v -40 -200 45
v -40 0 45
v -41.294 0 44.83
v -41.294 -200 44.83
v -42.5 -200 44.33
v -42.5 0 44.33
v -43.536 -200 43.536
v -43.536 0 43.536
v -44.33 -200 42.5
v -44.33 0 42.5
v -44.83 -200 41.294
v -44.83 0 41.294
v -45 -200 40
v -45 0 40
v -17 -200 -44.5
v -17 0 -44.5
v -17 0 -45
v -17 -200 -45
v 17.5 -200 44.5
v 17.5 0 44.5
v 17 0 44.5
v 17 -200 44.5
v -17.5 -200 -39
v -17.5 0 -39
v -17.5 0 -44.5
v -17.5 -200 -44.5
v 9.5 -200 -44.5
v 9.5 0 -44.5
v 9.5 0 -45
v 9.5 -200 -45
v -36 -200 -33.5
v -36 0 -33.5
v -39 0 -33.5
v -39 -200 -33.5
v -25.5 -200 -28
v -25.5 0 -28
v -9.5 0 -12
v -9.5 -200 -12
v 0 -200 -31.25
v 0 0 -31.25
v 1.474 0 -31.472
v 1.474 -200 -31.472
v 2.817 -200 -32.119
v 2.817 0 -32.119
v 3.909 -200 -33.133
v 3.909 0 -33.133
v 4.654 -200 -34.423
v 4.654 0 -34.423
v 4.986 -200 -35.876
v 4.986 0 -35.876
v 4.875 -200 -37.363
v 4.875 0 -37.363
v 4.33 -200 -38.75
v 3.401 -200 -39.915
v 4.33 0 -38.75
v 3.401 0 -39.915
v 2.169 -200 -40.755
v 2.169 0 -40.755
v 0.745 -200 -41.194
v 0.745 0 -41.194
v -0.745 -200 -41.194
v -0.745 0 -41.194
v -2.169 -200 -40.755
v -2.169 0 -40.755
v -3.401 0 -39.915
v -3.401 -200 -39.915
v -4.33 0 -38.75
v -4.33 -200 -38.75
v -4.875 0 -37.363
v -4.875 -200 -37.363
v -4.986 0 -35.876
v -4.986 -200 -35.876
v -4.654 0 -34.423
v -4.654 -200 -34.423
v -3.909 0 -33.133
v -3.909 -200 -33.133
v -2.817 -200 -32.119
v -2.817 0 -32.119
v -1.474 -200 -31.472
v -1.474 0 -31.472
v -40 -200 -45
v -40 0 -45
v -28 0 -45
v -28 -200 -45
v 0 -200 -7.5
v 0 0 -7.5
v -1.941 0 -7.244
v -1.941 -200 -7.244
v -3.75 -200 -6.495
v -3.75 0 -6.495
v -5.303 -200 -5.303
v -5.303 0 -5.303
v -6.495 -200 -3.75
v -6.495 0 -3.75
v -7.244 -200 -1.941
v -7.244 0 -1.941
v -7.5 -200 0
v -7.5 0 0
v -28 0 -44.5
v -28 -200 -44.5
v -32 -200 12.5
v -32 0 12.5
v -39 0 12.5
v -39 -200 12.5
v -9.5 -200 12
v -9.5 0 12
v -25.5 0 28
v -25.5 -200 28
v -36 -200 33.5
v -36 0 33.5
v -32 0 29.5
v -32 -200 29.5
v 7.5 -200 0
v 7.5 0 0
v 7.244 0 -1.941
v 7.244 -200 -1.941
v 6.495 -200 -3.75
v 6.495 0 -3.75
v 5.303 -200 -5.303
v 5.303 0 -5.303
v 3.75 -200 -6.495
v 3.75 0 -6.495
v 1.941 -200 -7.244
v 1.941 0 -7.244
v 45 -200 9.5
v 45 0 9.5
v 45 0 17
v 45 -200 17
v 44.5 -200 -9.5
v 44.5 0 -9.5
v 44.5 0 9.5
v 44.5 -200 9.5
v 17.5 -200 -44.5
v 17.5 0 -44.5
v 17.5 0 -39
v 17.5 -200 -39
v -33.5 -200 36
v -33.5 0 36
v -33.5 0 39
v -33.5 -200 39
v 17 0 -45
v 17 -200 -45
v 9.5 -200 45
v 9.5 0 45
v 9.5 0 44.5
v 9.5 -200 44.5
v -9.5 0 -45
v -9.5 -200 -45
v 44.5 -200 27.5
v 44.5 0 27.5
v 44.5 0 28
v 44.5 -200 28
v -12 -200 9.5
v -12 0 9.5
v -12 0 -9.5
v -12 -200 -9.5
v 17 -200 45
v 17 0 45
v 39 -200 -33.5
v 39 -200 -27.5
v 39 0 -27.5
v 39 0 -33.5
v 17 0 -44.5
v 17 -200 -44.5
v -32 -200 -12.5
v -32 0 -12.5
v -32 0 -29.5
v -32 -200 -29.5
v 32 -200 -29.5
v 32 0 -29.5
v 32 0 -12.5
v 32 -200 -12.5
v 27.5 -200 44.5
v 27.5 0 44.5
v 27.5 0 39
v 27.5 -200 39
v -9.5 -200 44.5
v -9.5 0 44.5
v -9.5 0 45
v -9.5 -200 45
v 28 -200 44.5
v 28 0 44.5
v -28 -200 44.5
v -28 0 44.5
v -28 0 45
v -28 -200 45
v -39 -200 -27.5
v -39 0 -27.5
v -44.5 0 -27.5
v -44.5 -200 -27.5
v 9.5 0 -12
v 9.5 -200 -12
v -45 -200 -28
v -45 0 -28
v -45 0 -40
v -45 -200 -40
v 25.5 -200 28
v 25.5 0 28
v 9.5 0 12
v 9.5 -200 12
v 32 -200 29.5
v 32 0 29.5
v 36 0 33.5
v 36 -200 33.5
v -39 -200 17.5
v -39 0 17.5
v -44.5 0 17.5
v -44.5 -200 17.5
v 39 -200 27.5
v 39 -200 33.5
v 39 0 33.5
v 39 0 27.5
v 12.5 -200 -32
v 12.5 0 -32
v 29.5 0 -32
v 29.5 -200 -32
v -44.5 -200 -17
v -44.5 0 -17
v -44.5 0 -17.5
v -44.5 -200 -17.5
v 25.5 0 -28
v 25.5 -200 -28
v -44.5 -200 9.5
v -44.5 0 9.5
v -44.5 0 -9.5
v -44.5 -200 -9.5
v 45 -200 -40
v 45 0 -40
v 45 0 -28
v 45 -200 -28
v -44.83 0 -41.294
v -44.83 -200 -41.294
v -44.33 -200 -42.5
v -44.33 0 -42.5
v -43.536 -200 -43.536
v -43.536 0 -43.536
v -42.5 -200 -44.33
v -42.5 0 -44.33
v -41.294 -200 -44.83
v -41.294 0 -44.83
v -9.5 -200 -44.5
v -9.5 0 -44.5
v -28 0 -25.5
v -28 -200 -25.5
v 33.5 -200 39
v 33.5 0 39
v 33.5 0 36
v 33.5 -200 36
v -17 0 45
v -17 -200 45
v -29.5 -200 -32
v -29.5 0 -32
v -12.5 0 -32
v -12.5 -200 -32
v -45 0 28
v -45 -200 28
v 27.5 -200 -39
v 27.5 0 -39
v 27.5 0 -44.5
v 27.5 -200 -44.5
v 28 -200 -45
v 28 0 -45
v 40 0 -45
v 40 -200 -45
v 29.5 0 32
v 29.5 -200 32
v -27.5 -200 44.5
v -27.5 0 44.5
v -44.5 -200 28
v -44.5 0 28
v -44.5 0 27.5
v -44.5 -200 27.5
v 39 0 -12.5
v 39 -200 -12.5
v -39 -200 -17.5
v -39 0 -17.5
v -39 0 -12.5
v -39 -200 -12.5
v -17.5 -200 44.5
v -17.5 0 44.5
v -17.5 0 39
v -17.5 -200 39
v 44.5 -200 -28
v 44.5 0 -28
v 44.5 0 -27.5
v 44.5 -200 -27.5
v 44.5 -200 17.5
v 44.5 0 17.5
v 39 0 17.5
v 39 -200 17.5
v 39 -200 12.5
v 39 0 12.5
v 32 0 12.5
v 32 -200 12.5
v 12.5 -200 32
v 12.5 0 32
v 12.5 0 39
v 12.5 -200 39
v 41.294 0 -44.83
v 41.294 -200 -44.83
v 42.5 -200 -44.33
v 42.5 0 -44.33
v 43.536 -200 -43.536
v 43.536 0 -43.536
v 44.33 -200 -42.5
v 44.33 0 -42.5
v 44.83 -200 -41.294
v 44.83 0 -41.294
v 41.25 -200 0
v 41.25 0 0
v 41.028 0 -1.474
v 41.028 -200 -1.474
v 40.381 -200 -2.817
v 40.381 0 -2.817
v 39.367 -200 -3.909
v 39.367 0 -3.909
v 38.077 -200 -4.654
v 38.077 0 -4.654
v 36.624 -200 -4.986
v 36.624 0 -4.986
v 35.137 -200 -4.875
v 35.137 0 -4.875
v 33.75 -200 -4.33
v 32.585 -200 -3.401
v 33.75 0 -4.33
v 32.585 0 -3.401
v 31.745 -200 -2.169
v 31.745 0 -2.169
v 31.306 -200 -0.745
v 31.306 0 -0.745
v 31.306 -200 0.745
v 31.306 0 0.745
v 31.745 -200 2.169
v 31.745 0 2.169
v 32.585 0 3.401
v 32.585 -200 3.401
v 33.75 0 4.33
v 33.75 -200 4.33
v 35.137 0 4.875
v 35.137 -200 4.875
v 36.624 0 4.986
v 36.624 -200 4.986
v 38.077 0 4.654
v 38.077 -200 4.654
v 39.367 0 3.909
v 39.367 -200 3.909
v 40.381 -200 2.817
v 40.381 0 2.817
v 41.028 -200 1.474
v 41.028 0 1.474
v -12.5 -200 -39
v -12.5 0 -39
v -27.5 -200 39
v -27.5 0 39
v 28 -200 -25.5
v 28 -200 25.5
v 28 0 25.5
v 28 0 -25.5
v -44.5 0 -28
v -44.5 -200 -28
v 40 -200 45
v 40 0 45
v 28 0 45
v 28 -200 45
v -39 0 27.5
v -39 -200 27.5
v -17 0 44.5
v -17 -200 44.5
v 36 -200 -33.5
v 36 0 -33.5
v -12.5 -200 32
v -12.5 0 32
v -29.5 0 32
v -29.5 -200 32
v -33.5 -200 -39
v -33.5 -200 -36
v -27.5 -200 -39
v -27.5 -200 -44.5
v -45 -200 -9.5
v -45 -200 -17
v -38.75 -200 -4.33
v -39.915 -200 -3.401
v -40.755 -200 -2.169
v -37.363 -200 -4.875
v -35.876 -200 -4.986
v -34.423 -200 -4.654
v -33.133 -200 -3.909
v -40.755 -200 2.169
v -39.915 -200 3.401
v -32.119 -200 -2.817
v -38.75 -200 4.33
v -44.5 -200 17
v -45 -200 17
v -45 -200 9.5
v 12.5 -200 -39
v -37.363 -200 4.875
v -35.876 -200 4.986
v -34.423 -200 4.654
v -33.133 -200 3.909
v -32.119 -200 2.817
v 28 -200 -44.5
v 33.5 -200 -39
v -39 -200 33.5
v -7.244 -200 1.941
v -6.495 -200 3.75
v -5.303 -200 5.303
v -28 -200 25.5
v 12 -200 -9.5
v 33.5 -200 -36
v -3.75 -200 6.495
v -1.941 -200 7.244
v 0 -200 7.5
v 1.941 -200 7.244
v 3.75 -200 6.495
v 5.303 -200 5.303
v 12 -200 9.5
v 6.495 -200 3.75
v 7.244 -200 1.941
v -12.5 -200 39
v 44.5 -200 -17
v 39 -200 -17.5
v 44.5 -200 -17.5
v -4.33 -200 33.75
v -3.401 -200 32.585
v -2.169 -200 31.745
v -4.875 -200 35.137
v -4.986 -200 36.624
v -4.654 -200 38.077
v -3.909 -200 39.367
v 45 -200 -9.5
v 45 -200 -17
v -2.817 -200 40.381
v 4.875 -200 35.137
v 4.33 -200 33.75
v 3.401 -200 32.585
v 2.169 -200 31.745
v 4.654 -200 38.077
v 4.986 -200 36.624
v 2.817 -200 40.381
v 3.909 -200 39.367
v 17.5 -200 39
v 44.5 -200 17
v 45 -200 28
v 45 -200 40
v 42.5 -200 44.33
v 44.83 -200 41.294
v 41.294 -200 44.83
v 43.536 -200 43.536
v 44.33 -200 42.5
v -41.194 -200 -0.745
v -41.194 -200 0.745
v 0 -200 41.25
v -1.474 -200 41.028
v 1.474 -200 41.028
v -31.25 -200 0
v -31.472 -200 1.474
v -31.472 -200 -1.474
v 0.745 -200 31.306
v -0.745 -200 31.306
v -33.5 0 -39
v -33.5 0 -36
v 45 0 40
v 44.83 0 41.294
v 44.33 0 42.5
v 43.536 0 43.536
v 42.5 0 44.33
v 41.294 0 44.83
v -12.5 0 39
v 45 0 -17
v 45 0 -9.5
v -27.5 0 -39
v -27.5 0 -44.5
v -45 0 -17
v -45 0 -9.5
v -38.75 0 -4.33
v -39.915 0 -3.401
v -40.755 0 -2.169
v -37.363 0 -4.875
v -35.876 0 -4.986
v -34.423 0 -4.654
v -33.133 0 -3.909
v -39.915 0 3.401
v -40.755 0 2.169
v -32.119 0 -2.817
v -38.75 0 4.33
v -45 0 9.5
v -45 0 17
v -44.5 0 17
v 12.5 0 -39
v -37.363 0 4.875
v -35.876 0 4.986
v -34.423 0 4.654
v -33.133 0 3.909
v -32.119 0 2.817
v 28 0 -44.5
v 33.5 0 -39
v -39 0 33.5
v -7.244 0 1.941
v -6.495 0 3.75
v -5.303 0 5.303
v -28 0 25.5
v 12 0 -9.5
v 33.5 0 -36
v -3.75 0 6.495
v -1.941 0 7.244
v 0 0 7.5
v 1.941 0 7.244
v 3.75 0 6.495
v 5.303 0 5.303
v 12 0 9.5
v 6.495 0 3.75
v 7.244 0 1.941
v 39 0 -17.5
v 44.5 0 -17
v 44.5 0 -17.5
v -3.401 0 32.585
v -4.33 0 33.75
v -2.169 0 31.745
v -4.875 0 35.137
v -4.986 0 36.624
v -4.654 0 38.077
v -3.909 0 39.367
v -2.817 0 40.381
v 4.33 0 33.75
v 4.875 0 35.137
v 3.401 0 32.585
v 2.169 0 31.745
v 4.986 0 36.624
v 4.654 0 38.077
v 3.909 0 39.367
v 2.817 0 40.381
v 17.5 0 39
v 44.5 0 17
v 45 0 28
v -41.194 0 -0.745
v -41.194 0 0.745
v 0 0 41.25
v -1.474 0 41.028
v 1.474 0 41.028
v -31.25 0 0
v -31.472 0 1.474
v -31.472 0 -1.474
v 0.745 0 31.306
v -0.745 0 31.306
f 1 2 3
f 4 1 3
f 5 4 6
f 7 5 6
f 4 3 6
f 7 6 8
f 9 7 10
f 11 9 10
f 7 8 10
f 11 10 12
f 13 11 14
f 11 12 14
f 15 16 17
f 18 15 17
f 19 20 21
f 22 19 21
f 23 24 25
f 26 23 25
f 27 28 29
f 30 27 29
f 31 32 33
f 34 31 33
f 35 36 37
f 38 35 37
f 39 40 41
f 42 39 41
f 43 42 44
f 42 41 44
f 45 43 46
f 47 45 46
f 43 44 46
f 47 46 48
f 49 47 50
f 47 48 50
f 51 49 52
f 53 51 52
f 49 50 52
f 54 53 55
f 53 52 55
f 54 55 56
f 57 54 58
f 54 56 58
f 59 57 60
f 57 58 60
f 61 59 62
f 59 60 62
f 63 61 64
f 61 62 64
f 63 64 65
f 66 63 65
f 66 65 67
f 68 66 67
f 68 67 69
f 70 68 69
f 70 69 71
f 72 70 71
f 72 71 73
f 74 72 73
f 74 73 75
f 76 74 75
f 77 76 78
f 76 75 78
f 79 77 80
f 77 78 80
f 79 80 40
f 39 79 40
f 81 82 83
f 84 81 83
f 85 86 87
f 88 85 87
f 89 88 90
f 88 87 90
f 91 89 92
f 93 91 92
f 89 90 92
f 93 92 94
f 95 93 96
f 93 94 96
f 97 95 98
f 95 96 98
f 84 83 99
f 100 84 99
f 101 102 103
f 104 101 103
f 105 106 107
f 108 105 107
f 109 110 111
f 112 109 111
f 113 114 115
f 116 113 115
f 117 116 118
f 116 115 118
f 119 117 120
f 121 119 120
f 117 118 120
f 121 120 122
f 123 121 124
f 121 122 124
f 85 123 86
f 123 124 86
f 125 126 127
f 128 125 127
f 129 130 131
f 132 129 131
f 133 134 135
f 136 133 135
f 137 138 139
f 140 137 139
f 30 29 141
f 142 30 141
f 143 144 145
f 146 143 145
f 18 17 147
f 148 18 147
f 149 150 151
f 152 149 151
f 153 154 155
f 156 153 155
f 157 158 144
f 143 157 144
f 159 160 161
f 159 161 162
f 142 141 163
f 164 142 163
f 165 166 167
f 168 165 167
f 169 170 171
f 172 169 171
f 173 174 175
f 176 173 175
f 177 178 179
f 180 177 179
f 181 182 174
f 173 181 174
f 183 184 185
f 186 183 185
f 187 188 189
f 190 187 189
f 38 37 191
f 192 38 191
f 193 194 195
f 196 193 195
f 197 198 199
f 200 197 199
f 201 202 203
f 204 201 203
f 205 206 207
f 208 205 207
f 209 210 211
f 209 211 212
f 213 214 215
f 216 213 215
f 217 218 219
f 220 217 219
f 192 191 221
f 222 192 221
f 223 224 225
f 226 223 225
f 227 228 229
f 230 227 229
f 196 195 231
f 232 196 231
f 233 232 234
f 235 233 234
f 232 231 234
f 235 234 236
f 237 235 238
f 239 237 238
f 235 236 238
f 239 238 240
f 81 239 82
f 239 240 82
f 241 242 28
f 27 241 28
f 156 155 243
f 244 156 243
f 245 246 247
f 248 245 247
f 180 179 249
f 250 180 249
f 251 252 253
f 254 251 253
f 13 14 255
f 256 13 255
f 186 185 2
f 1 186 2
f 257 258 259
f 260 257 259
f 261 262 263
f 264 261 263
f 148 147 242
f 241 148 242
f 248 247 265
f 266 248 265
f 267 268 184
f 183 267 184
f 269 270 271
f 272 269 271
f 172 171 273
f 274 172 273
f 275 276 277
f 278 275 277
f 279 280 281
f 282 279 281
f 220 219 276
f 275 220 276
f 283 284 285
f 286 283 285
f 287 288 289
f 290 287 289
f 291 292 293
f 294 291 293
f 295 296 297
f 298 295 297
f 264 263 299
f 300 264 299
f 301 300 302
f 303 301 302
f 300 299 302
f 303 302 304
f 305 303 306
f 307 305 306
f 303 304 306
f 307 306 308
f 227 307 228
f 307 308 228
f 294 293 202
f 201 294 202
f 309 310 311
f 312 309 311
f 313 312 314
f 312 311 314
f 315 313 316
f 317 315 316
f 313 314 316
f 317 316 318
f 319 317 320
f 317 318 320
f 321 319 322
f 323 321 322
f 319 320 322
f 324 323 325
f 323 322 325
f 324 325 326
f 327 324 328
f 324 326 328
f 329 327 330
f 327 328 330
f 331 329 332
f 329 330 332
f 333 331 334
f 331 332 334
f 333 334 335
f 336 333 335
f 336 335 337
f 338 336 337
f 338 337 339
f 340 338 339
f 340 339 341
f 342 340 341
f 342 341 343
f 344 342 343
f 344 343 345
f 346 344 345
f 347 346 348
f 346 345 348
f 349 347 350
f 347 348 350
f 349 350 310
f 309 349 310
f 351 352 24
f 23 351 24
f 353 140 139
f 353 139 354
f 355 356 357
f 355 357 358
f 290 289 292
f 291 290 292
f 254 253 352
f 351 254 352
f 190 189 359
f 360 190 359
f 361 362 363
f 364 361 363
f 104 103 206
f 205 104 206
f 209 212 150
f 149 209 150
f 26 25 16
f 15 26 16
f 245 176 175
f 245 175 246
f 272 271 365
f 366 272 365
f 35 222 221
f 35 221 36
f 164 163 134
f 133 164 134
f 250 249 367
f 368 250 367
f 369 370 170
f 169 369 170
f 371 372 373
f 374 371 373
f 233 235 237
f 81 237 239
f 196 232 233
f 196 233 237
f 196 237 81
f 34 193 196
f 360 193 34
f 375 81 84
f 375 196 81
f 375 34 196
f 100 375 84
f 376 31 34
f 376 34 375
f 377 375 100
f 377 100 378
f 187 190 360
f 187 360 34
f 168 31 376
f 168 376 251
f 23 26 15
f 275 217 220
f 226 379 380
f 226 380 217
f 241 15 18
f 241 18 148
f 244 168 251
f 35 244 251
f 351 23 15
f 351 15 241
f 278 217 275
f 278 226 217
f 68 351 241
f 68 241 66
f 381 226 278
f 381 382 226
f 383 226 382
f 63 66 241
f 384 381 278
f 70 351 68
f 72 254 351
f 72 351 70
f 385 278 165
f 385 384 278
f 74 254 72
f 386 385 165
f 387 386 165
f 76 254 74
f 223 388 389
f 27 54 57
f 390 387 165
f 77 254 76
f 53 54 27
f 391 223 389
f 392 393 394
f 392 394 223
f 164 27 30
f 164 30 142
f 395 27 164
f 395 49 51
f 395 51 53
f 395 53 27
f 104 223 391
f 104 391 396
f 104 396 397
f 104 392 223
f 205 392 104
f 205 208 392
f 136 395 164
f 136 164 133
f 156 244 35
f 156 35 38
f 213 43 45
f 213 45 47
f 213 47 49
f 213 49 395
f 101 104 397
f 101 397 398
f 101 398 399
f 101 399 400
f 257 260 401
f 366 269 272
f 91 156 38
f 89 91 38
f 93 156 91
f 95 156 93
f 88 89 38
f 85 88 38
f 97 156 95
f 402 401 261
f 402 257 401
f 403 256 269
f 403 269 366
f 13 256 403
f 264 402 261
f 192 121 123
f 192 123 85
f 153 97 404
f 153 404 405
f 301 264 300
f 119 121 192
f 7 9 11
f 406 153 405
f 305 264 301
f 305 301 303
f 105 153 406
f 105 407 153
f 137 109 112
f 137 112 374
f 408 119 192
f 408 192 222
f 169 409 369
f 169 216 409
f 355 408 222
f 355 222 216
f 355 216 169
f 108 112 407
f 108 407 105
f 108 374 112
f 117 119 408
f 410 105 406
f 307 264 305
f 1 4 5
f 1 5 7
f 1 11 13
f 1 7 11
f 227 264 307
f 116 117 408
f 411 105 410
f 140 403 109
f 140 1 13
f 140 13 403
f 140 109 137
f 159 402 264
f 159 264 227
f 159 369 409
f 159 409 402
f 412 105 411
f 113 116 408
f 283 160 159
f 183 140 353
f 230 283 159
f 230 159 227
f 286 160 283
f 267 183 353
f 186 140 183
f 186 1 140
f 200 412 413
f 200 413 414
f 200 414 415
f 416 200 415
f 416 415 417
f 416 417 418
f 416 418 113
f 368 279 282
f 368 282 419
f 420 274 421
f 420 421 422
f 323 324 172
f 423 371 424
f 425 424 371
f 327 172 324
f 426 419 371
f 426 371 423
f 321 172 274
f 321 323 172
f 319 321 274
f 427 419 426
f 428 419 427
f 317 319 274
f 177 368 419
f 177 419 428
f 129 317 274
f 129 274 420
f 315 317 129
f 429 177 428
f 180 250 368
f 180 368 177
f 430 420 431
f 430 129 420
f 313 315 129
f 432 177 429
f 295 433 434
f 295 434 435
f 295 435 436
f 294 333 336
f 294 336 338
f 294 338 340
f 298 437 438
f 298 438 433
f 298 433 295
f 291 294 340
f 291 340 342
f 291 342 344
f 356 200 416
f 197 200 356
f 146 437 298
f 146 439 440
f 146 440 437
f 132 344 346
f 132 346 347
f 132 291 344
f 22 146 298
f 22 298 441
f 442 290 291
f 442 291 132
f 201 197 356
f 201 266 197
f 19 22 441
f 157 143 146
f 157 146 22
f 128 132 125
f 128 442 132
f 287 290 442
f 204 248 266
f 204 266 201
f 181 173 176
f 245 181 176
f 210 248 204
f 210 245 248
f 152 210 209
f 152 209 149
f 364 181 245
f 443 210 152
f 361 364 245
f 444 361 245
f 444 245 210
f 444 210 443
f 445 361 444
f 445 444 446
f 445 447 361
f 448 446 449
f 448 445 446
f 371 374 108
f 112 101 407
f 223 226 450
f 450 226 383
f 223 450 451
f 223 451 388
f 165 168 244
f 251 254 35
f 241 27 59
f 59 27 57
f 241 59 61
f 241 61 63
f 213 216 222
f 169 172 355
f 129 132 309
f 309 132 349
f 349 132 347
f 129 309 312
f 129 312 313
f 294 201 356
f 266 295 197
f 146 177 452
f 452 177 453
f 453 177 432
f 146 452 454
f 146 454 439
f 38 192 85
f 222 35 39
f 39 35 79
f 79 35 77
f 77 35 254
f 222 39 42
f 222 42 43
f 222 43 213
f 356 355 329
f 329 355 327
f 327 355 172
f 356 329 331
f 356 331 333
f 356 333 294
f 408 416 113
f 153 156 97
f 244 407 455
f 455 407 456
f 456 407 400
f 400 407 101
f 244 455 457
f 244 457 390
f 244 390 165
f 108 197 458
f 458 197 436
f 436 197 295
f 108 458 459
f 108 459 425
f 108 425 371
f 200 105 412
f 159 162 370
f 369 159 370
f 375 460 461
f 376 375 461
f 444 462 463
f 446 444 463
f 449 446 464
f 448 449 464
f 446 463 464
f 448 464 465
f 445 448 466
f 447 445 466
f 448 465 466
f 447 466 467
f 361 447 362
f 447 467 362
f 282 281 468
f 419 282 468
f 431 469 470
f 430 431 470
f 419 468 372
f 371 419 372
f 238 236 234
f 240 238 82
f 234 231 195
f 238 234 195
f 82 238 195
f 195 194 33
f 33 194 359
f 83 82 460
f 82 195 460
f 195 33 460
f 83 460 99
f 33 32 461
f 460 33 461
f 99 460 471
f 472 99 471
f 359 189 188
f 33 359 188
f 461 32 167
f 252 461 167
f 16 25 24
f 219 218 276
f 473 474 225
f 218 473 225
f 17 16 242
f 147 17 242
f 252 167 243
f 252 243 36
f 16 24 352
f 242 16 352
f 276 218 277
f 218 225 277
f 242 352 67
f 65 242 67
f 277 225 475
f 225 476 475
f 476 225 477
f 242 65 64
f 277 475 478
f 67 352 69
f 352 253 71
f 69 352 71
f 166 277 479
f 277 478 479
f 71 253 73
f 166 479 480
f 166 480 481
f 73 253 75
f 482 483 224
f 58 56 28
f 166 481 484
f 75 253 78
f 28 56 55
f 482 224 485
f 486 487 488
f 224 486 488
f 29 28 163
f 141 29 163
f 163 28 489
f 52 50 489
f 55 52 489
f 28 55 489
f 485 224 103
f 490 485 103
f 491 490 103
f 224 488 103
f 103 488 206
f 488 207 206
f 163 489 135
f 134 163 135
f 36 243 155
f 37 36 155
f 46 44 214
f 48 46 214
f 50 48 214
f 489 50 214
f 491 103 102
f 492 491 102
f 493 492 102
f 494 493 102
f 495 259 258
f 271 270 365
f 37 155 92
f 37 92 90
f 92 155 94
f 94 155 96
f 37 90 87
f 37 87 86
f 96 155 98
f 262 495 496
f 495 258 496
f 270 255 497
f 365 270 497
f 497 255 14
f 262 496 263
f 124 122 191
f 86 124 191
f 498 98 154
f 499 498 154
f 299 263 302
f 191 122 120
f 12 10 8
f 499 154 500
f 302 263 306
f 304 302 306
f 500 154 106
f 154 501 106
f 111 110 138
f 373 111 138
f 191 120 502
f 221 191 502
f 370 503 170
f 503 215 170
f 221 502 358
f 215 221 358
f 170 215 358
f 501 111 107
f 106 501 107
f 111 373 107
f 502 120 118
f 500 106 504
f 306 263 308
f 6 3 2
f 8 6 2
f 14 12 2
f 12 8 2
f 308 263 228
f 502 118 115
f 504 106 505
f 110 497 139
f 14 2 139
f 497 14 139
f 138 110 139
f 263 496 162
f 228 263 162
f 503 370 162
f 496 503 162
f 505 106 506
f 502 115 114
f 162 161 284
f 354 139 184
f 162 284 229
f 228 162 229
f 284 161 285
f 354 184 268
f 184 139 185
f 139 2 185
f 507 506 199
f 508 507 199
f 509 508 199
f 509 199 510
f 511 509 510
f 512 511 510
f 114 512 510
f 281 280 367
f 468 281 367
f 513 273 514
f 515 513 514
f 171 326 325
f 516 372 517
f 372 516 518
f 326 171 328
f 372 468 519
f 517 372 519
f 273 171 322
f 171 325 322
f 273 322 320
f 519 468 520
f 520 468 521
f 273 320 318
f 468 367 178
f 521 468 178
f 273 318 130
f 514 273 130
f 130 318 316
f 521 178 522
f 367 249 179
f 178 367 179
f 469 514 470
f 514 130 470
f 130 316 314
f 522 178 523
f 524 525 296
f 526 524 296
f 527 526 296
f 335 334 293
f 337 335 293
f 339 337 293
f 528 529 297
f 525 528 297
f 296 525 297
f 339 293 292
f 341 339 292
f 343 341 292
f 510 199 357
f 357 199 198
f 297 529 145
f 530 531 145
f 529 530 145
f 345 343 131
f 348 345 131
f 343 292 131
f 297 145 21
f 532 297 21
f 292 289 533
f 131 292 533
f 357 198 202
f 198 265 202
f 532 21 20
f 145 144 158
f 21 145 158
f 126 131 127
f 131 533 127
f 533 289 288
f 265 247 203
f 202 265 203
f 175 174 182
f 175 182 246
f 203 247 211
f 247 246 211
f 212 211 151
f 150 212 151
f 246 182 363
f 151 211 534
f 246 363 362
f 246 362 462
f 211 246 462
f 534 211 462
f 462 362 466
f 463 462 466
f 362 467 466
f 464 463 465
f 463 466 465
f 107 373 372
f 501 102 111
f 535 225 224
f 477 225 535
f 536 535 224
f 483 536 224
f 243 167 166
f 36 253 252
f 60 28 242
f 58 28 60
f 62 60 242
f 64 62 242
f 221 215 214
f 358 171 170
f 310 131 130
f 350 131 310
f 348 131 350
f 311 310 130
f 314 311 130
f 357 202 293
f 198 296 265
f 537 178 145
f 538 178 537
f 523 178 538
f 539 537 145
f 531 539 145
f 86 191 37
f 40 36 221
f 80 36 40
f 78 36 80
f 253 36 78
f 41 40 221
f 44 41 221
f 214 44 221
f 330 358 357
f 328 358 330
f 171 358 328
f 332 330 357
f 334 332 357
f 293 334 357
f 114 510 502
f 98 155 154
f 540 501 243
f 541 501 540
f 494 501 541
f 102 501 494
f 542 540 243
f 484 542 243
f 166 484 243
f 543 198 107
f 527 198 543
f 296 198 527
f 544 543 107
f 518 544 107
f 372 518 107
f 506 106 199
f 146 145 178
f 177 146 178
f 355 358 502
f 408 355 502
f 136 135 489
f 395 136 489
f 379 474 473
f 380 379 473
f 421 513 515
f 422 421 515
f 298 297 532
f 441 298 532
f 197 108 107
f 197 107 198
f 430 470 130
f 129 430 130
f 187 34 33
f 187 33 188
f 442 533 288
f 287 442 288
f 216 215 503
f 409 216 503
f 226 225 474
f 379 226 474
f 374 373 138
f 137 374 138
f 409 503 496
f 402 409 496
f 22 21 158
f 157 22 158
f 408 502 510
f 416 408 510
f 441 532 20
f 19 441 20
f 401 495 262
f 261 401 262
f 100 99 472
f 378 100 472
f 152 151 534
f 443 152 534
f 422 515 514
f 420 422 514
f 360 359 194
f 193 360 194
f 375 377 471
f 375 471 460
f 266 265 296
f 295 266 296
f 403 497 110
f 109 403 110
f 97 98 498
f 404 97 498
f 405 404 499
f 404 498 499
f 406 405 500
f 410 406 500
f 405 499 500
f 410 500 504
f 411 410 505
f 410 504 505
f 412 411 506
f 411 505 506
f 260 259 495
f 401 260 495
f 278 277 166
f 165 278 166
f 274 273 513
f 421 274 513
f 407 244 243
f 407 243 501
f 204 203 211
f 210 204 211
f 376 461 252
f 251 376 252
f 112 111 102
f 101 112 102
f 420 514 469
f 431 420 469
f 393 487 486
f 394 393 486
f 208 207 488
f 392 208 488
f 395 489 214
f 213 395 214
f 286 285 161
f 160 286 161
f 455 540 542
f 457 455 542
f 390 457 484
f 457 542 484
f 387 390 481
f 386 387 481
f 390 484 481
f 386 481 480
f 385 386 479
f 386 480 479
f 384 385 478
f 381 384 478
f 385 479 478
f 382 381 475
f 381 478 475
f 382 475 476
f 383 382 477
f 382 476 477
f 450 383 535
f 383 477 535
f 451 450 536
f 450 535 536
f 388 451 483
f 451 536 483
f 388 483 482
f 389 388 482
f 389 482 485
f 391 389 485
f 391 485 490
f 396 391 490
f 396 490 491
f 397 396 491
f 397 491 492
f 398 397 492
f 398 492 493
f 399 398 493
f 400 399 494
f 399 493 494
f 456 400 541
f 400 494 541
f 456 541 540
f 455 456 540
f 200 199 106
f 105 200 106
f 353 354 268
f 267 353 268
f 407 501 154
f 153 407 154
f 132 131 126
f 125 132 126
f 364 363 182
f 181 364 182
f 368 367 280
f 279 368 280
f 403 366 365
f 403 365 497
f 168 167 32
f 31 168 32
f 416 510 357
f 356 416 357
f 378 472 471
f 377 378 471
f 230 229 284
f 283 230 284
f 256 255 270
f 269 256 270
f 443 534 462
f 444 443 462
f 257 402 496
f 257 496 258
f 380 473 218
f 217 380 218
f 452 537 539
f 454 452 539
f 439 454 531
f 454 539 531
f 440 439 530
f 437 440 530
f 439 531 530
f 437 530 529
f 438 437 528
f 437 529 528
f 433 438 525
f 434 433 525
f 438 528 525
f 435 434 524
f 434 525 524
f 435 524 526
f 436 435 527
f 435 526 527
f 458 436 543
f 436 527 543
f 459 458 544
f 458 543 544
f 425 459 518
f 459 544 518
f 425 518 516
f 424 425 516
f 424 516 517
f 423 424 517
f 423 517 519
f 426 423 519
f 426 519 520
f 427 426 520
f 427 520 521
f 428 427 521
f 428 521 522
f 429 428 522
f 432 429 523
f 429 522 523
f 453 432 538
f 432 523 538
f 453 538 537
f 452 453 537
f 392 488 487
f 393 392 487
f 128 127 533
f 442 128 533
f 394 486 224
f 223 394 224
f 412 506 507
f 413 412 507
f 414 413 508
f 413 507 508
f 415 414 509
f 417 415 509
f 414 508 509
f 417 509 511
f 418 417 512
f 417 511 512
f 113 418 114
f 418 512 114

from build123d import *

# Parameters (mm, degrees)
F1_DEPTH = 200


with BuildPart() as f1:
    # F0 (on Front) → F1 (new body)
    with BuildSketch(Plane.XZ):
        with BuildLine():
            Line((0, 41.25), (0, 44.5))
            Line((0, 44.5), (-9.5, 44.5))
            Line((-9.5, 44.5), (-9.5, 45))
            Line((-9.5, 45), (-17, 45))
            Line((-17, 45), (-17, 44.5))
            Line((-17, 44.5), (-17.5, 44.5))
            Line((-17.5, 44.5), (-17.5, 39))
            Line((-17.5, 39), (-12.5, 39))
            Line((-12.5, 39), (-12.5, 32))
            Line((-12.5, 32), (-29.5, 32))
            Line((-29.5, 32), (-33.5, 36))
            Line((-33.5, 36), (-33.5, 39))
            Line((-33.5, 39), (-27.5, 39))
            Line((-27.5, 39), (-27.5, 44.5))
            Line((-27.5, 44.5), (-28, 44.5))
            Line((-28, 44.5), (-28, 45))
            Line((-28, 45), (-40, 45))
            ThreePointArc((-40, 45), (-43.535534, 43.535534), (-45, 40))
            Line((-45, 40), (-45, 28))
            Line((-45, 28), (-44.5, 28))
            Line((-44.5, 28), (-44.5, 27.5))
            Line((-44.5, 27.5), (-39, 27.5))
            Line((-39, 27.5), (-39, 33.5))
            Line((-39, 33.5), (-36, 33.5))
            Line((-36, 33.5), (-32, 29.5))
            Line((-32, 29.5), (-32, 12.5))
            Line((-32, 12.5), (-39, 12.5))
            Line((-39, 12.5), (-39, 17.5))
            Line((-39, 17.5), (-44.5, 17.5))
            Line((-44.5, 17.5), (-44.5, 17))
            Line((-44.5, 17), (-45, 17))
            Line((-45, 17), (-45, 9.5))
            Line((-45, 9.5), (-44.5, 9.5))
            Line((-44.5, 9.5), (-44.5, 0))
            Line((-44.5, 0), (-41.25, 0))
            ThreePointArc((-41.25, 0), (-36.25, 5), (-31.25, 0))
            Line((-31.25, 0), (-28, 0))
            Line((-28, 0), (-28, 25.5))
            Line((-28, 25.5), (-12, 9.5))
            Line((-12, 9.5), (-12, 0))
            Line((-12, 0), (-7.5, 0))
            ThreePointArc((-7.5, 0), (-5.303301, 5.303301), (0, 7.5))
            Line((0, 7.5), (0, 12))
            Line((0, 12), (-9.5, 12))
            Line((-9.5, 12), (-25.5, 28))
            Line((-25.5, 28), (0, 28))
            Line((0, 28), (0, 31.25))
            ThreePointArc((0, 31.25), (-5, 36.25), (0, 41.25))
        make_face()
        with BuildLine():
            Line((40, 45), (28, 45))
            Line((28, 45), (28, 44.5))
            Line((28, 44.5), (27.5, 44.5))
            Line((27.5, 44.5), (27.5, 39))
            Line((27.5, 39), (33.5, 39))
            Line((33.5, 39), (33.5, 36))
            Line((33.5, 36), (29.5, 32))
            Line((29.5, 32), (12.5, 32))
            Line((12.5, 32), (12.5, 39))
            Line((12.5, 39), (17.5, 39))
            Line((17.5, 39), (17.5, 44.5))
            Line((17.5, 44.5), (17, 44.5))
            Line((17, 44.5), (17, 45))
            Line((17, 45), (9.5, 45))
            Line((9.5, 45), (9.5, 44.5))
            Line((9.5, 44.5), (0, 44.5))
            Line((0, 44.5), (0, 41.25))
            ThreePointArc((0, 41.25), (5, 36.25), (0, 31.25))
            Line((0, 31.25), (0, 28))
            Line((0, 28), (25.5, 28))
            Line((25.5, 28), (9.5, 12))
            Line((9.5, 12), (0, 12))
            Line((0, 12), (0, 7.5))
            ThreePointArc((0, 7.5), (5.303301, 5.303301), (7.5, 0))
            Line((7.5, 0), (12, 0))
            Line((12, 0), (12, 9.5))
            Line((12, 9.5), (28, 25.5))
            Line((28, 25.5), (28, 0))
            Line((28, 0), (31.25, 0))
            ThreePointArc((31.25, 0), (36.25, 5), (41.25, 0))
            Line((41.25, 0), (44.5, 0))
            Line((44.5, 0), (44.5, 9.5))
            Line((44.5, 9.5), (45, 9.5))
            Line((45, 9.5), (45, 17))
            Line((45, 17), (44.5, 17))
            Line((44.5, 17), (44.5, 17.5))
            Line((44.5, 17.5), (39, 17.5))
            Line((39, 17.5), (39, 12.5))
            Line((39, 12.5), (32, 12.5))
            Line((32, 12.5), (32, 29.5))
            Line((32, 29.5), (36, 33.5))
            Line((36, 33.5), (39, 33.5))
            Line((39, 33.5), (39, 27.5))
            Line((39, 27.5), (44.5, 27.5))
            Line((44.5, 27.5), (44.5, 28))
            Line((44.5, 28), (45, 28))
            Line((45, 28), (45, 40))
            ThreePointArc((45, 40), (43.535534, 43.535534), (40, 45))
        make_face()
        with BuildLine():
            ThreePointArc((0, -7.5), (-5.303301, -5.303301), (-7.5, 0))
            Line((-7.5, 0), (-12, 0))
            Line((-12, 0), (-12, -9.5))
            Line((-12, -9.5), (-28, -25.5))
            Line((-28, -25.5), (-28, 0))
            Line((-28, 0), (-31.25, 0))
            ThreePointArc((-31.25, 0), (-36.25, -5), (-41.25, 0))
            Line((-41.25, 0), (-44.5, 0))
            Line((-44.5, 0), (-44.5, -9.5))
            Line((-44.5, -9.5), (-45, -9.5))
            Line((-45, -9.5), (-45, -17))
            Line((-45, -17), (-44.5, -17))
            Line((-44.5, -17), (-44.5, -17.5))
            Line((-44.5, -17.5), (-39, -17.5))
            Line((-39, -17.5), (-39, -12.5))
            Line((-39, -12.5), (-32, -12.5))
            Line((-32, -12.5), (-32, -29.5))
            Line((-32, -29.5), (-36, -33.5))
            Line((-36, -33.5), (-39, -33.5))
            Line((-39, -33.5), (-39, -27.5))
            Line((-39, -27.5), (-44.5, -27.5))
            Line((-44.5, -27.5), (-44.5, -28))
            Line((-44.5, -28), (-45, -28))
            Line((-45, -28), (-45, -40))
            ThreePointArc((-45, -40), (-43.535534, -43.535534), (-40, -45))
            Line((-40, -45), (-28, -45))
            Line((-28, -45), (-28, -44.5))
            Line((-28, -44.5), (-27.5, -44.5))
            Line((-27.5, -44.5), (-27.5, -39))
            Line((-27.5, -39), (-33.5, -39))
            Line((-33.5, -39), (-33.5, -36))
            Line((-33.5, -36), (-29.5, -32))
            Line((-29.5, -32), (-12.5, -32))
            Line((-12.5, -32), (-12.5, -39))
            Line((-12.5, -39), (-17.5, -39))
            Line((-17.5, -39), (-17.5, -44.5))
            Line((-17.5, -44.5), (-17, -44.5))
            Line((-17, -44.5), (-17, -45))
            Line((-17, -45), (-9.5, -45))
            Line((-9.5, -45), (-9.5, -44.5))
            Line((-9.5, -44.5), (0, -44.5))
            Line((0, -44.5), (0, -41.25))
            ThreePointArc((0, -41.25), (-5, -36.25), (0, -31.25))
            Line((0, -31.25), (0, -28))
            Line((0, -28), (-25.5, -28))
            Line((-25.5, -28), (-9.5, -12))
            Line((-9.5, -12), (0, -12))
            Line((0, -12), (0, -7.5))
        make_face()
        with BuildLine():
            Line((44.5, -9.5), (44.5, 0))
            Line((44.5, 0), (41.25, 0))
            ThreePointArc((41.25, 0), (36.25, -5), (31.25, 0))
            Line((31.25, 0), (28, 0))
            Line((28, 0), (28, -25.5))
            Line((28, -25.5), (12, -9.5))
            Line((12, -9.5), (12, 0))
            Line((12, 0), (7.5, 0))
            ThreePointArc((7.5, 0), (5.303301, -5.303301), (0, -7.5))
            Line((0, -7.5), (0, -12))
            Line((0, -12), (9.5, -12))
            Line((9.5, -12), (25.5, -28))
            Line((25.5, -28), (0, -28))
            Line((0, -28), (0, -31.25))
            ThreePointArc((0, -31.25), (5, -36.25), (0, -41.25))
            Line((0, -41.25), (0, -44.5))
            Line((0, -44.5), (9.5, -44.5))
            Line((9.5, -44.5), (9.5, -45))
            Line((9.5, -45), (17, -45))
            Line((17, -45), (17, -44.5))
            Line((17, -44.5), (17.5, -44.5))
            Line((17.5, -44.5), (17.5, -39))
            Line((17.5, -39), (12.5, -39))
            Line((12.5, -39), (12.5, -32))
            Line((12.5, -32), (29.5, -32))
            Line((29.5, -32), (33.5, -36))
            Line((33.5, -36), (33.5, -39))
            Line((33.5, -39), (27.5, -39))
            Line((27.5, -39), (27.5, -44.5))
            Line((27.5, -44.5), (28, -44.5))
            Line((28, -44.5), (28, -45))
            Line((28, -45), (40, -45))
            ThreePointArc((40, -45), (43.535534, -43.535534), (45, -40))
            Line((45, -40), (45, -28))
            Line((45, -28), (44.5, -28))
            Line((44.5, -28), (44.5, -27.5))
            Line((44.5, -27.5), (39, -27.5))
            Line((39, -27.5), (39, -33.5))
            Line((39, -33.5), (36, -33.5))
            Line((36, -33.5), (32, -29.5))
            Line((32, -29.5), (32, -12.5))
            Line((32, -12.5), (39, -12.5))
            Line((39, -12.5), (39, -17.5))
            Line((39, -17.5), (44.5, -17.5))
            Line((44.5, -17.5), (44.5, -17))
            Line((44.5, -17), (45, -17))
            Line((45, -17), (45, -9.5))
            Line((45, -9.5), (44.5, -9.5))
        make_face()
    extrude(amount=F1_DEPTH)


solid = f1.part
